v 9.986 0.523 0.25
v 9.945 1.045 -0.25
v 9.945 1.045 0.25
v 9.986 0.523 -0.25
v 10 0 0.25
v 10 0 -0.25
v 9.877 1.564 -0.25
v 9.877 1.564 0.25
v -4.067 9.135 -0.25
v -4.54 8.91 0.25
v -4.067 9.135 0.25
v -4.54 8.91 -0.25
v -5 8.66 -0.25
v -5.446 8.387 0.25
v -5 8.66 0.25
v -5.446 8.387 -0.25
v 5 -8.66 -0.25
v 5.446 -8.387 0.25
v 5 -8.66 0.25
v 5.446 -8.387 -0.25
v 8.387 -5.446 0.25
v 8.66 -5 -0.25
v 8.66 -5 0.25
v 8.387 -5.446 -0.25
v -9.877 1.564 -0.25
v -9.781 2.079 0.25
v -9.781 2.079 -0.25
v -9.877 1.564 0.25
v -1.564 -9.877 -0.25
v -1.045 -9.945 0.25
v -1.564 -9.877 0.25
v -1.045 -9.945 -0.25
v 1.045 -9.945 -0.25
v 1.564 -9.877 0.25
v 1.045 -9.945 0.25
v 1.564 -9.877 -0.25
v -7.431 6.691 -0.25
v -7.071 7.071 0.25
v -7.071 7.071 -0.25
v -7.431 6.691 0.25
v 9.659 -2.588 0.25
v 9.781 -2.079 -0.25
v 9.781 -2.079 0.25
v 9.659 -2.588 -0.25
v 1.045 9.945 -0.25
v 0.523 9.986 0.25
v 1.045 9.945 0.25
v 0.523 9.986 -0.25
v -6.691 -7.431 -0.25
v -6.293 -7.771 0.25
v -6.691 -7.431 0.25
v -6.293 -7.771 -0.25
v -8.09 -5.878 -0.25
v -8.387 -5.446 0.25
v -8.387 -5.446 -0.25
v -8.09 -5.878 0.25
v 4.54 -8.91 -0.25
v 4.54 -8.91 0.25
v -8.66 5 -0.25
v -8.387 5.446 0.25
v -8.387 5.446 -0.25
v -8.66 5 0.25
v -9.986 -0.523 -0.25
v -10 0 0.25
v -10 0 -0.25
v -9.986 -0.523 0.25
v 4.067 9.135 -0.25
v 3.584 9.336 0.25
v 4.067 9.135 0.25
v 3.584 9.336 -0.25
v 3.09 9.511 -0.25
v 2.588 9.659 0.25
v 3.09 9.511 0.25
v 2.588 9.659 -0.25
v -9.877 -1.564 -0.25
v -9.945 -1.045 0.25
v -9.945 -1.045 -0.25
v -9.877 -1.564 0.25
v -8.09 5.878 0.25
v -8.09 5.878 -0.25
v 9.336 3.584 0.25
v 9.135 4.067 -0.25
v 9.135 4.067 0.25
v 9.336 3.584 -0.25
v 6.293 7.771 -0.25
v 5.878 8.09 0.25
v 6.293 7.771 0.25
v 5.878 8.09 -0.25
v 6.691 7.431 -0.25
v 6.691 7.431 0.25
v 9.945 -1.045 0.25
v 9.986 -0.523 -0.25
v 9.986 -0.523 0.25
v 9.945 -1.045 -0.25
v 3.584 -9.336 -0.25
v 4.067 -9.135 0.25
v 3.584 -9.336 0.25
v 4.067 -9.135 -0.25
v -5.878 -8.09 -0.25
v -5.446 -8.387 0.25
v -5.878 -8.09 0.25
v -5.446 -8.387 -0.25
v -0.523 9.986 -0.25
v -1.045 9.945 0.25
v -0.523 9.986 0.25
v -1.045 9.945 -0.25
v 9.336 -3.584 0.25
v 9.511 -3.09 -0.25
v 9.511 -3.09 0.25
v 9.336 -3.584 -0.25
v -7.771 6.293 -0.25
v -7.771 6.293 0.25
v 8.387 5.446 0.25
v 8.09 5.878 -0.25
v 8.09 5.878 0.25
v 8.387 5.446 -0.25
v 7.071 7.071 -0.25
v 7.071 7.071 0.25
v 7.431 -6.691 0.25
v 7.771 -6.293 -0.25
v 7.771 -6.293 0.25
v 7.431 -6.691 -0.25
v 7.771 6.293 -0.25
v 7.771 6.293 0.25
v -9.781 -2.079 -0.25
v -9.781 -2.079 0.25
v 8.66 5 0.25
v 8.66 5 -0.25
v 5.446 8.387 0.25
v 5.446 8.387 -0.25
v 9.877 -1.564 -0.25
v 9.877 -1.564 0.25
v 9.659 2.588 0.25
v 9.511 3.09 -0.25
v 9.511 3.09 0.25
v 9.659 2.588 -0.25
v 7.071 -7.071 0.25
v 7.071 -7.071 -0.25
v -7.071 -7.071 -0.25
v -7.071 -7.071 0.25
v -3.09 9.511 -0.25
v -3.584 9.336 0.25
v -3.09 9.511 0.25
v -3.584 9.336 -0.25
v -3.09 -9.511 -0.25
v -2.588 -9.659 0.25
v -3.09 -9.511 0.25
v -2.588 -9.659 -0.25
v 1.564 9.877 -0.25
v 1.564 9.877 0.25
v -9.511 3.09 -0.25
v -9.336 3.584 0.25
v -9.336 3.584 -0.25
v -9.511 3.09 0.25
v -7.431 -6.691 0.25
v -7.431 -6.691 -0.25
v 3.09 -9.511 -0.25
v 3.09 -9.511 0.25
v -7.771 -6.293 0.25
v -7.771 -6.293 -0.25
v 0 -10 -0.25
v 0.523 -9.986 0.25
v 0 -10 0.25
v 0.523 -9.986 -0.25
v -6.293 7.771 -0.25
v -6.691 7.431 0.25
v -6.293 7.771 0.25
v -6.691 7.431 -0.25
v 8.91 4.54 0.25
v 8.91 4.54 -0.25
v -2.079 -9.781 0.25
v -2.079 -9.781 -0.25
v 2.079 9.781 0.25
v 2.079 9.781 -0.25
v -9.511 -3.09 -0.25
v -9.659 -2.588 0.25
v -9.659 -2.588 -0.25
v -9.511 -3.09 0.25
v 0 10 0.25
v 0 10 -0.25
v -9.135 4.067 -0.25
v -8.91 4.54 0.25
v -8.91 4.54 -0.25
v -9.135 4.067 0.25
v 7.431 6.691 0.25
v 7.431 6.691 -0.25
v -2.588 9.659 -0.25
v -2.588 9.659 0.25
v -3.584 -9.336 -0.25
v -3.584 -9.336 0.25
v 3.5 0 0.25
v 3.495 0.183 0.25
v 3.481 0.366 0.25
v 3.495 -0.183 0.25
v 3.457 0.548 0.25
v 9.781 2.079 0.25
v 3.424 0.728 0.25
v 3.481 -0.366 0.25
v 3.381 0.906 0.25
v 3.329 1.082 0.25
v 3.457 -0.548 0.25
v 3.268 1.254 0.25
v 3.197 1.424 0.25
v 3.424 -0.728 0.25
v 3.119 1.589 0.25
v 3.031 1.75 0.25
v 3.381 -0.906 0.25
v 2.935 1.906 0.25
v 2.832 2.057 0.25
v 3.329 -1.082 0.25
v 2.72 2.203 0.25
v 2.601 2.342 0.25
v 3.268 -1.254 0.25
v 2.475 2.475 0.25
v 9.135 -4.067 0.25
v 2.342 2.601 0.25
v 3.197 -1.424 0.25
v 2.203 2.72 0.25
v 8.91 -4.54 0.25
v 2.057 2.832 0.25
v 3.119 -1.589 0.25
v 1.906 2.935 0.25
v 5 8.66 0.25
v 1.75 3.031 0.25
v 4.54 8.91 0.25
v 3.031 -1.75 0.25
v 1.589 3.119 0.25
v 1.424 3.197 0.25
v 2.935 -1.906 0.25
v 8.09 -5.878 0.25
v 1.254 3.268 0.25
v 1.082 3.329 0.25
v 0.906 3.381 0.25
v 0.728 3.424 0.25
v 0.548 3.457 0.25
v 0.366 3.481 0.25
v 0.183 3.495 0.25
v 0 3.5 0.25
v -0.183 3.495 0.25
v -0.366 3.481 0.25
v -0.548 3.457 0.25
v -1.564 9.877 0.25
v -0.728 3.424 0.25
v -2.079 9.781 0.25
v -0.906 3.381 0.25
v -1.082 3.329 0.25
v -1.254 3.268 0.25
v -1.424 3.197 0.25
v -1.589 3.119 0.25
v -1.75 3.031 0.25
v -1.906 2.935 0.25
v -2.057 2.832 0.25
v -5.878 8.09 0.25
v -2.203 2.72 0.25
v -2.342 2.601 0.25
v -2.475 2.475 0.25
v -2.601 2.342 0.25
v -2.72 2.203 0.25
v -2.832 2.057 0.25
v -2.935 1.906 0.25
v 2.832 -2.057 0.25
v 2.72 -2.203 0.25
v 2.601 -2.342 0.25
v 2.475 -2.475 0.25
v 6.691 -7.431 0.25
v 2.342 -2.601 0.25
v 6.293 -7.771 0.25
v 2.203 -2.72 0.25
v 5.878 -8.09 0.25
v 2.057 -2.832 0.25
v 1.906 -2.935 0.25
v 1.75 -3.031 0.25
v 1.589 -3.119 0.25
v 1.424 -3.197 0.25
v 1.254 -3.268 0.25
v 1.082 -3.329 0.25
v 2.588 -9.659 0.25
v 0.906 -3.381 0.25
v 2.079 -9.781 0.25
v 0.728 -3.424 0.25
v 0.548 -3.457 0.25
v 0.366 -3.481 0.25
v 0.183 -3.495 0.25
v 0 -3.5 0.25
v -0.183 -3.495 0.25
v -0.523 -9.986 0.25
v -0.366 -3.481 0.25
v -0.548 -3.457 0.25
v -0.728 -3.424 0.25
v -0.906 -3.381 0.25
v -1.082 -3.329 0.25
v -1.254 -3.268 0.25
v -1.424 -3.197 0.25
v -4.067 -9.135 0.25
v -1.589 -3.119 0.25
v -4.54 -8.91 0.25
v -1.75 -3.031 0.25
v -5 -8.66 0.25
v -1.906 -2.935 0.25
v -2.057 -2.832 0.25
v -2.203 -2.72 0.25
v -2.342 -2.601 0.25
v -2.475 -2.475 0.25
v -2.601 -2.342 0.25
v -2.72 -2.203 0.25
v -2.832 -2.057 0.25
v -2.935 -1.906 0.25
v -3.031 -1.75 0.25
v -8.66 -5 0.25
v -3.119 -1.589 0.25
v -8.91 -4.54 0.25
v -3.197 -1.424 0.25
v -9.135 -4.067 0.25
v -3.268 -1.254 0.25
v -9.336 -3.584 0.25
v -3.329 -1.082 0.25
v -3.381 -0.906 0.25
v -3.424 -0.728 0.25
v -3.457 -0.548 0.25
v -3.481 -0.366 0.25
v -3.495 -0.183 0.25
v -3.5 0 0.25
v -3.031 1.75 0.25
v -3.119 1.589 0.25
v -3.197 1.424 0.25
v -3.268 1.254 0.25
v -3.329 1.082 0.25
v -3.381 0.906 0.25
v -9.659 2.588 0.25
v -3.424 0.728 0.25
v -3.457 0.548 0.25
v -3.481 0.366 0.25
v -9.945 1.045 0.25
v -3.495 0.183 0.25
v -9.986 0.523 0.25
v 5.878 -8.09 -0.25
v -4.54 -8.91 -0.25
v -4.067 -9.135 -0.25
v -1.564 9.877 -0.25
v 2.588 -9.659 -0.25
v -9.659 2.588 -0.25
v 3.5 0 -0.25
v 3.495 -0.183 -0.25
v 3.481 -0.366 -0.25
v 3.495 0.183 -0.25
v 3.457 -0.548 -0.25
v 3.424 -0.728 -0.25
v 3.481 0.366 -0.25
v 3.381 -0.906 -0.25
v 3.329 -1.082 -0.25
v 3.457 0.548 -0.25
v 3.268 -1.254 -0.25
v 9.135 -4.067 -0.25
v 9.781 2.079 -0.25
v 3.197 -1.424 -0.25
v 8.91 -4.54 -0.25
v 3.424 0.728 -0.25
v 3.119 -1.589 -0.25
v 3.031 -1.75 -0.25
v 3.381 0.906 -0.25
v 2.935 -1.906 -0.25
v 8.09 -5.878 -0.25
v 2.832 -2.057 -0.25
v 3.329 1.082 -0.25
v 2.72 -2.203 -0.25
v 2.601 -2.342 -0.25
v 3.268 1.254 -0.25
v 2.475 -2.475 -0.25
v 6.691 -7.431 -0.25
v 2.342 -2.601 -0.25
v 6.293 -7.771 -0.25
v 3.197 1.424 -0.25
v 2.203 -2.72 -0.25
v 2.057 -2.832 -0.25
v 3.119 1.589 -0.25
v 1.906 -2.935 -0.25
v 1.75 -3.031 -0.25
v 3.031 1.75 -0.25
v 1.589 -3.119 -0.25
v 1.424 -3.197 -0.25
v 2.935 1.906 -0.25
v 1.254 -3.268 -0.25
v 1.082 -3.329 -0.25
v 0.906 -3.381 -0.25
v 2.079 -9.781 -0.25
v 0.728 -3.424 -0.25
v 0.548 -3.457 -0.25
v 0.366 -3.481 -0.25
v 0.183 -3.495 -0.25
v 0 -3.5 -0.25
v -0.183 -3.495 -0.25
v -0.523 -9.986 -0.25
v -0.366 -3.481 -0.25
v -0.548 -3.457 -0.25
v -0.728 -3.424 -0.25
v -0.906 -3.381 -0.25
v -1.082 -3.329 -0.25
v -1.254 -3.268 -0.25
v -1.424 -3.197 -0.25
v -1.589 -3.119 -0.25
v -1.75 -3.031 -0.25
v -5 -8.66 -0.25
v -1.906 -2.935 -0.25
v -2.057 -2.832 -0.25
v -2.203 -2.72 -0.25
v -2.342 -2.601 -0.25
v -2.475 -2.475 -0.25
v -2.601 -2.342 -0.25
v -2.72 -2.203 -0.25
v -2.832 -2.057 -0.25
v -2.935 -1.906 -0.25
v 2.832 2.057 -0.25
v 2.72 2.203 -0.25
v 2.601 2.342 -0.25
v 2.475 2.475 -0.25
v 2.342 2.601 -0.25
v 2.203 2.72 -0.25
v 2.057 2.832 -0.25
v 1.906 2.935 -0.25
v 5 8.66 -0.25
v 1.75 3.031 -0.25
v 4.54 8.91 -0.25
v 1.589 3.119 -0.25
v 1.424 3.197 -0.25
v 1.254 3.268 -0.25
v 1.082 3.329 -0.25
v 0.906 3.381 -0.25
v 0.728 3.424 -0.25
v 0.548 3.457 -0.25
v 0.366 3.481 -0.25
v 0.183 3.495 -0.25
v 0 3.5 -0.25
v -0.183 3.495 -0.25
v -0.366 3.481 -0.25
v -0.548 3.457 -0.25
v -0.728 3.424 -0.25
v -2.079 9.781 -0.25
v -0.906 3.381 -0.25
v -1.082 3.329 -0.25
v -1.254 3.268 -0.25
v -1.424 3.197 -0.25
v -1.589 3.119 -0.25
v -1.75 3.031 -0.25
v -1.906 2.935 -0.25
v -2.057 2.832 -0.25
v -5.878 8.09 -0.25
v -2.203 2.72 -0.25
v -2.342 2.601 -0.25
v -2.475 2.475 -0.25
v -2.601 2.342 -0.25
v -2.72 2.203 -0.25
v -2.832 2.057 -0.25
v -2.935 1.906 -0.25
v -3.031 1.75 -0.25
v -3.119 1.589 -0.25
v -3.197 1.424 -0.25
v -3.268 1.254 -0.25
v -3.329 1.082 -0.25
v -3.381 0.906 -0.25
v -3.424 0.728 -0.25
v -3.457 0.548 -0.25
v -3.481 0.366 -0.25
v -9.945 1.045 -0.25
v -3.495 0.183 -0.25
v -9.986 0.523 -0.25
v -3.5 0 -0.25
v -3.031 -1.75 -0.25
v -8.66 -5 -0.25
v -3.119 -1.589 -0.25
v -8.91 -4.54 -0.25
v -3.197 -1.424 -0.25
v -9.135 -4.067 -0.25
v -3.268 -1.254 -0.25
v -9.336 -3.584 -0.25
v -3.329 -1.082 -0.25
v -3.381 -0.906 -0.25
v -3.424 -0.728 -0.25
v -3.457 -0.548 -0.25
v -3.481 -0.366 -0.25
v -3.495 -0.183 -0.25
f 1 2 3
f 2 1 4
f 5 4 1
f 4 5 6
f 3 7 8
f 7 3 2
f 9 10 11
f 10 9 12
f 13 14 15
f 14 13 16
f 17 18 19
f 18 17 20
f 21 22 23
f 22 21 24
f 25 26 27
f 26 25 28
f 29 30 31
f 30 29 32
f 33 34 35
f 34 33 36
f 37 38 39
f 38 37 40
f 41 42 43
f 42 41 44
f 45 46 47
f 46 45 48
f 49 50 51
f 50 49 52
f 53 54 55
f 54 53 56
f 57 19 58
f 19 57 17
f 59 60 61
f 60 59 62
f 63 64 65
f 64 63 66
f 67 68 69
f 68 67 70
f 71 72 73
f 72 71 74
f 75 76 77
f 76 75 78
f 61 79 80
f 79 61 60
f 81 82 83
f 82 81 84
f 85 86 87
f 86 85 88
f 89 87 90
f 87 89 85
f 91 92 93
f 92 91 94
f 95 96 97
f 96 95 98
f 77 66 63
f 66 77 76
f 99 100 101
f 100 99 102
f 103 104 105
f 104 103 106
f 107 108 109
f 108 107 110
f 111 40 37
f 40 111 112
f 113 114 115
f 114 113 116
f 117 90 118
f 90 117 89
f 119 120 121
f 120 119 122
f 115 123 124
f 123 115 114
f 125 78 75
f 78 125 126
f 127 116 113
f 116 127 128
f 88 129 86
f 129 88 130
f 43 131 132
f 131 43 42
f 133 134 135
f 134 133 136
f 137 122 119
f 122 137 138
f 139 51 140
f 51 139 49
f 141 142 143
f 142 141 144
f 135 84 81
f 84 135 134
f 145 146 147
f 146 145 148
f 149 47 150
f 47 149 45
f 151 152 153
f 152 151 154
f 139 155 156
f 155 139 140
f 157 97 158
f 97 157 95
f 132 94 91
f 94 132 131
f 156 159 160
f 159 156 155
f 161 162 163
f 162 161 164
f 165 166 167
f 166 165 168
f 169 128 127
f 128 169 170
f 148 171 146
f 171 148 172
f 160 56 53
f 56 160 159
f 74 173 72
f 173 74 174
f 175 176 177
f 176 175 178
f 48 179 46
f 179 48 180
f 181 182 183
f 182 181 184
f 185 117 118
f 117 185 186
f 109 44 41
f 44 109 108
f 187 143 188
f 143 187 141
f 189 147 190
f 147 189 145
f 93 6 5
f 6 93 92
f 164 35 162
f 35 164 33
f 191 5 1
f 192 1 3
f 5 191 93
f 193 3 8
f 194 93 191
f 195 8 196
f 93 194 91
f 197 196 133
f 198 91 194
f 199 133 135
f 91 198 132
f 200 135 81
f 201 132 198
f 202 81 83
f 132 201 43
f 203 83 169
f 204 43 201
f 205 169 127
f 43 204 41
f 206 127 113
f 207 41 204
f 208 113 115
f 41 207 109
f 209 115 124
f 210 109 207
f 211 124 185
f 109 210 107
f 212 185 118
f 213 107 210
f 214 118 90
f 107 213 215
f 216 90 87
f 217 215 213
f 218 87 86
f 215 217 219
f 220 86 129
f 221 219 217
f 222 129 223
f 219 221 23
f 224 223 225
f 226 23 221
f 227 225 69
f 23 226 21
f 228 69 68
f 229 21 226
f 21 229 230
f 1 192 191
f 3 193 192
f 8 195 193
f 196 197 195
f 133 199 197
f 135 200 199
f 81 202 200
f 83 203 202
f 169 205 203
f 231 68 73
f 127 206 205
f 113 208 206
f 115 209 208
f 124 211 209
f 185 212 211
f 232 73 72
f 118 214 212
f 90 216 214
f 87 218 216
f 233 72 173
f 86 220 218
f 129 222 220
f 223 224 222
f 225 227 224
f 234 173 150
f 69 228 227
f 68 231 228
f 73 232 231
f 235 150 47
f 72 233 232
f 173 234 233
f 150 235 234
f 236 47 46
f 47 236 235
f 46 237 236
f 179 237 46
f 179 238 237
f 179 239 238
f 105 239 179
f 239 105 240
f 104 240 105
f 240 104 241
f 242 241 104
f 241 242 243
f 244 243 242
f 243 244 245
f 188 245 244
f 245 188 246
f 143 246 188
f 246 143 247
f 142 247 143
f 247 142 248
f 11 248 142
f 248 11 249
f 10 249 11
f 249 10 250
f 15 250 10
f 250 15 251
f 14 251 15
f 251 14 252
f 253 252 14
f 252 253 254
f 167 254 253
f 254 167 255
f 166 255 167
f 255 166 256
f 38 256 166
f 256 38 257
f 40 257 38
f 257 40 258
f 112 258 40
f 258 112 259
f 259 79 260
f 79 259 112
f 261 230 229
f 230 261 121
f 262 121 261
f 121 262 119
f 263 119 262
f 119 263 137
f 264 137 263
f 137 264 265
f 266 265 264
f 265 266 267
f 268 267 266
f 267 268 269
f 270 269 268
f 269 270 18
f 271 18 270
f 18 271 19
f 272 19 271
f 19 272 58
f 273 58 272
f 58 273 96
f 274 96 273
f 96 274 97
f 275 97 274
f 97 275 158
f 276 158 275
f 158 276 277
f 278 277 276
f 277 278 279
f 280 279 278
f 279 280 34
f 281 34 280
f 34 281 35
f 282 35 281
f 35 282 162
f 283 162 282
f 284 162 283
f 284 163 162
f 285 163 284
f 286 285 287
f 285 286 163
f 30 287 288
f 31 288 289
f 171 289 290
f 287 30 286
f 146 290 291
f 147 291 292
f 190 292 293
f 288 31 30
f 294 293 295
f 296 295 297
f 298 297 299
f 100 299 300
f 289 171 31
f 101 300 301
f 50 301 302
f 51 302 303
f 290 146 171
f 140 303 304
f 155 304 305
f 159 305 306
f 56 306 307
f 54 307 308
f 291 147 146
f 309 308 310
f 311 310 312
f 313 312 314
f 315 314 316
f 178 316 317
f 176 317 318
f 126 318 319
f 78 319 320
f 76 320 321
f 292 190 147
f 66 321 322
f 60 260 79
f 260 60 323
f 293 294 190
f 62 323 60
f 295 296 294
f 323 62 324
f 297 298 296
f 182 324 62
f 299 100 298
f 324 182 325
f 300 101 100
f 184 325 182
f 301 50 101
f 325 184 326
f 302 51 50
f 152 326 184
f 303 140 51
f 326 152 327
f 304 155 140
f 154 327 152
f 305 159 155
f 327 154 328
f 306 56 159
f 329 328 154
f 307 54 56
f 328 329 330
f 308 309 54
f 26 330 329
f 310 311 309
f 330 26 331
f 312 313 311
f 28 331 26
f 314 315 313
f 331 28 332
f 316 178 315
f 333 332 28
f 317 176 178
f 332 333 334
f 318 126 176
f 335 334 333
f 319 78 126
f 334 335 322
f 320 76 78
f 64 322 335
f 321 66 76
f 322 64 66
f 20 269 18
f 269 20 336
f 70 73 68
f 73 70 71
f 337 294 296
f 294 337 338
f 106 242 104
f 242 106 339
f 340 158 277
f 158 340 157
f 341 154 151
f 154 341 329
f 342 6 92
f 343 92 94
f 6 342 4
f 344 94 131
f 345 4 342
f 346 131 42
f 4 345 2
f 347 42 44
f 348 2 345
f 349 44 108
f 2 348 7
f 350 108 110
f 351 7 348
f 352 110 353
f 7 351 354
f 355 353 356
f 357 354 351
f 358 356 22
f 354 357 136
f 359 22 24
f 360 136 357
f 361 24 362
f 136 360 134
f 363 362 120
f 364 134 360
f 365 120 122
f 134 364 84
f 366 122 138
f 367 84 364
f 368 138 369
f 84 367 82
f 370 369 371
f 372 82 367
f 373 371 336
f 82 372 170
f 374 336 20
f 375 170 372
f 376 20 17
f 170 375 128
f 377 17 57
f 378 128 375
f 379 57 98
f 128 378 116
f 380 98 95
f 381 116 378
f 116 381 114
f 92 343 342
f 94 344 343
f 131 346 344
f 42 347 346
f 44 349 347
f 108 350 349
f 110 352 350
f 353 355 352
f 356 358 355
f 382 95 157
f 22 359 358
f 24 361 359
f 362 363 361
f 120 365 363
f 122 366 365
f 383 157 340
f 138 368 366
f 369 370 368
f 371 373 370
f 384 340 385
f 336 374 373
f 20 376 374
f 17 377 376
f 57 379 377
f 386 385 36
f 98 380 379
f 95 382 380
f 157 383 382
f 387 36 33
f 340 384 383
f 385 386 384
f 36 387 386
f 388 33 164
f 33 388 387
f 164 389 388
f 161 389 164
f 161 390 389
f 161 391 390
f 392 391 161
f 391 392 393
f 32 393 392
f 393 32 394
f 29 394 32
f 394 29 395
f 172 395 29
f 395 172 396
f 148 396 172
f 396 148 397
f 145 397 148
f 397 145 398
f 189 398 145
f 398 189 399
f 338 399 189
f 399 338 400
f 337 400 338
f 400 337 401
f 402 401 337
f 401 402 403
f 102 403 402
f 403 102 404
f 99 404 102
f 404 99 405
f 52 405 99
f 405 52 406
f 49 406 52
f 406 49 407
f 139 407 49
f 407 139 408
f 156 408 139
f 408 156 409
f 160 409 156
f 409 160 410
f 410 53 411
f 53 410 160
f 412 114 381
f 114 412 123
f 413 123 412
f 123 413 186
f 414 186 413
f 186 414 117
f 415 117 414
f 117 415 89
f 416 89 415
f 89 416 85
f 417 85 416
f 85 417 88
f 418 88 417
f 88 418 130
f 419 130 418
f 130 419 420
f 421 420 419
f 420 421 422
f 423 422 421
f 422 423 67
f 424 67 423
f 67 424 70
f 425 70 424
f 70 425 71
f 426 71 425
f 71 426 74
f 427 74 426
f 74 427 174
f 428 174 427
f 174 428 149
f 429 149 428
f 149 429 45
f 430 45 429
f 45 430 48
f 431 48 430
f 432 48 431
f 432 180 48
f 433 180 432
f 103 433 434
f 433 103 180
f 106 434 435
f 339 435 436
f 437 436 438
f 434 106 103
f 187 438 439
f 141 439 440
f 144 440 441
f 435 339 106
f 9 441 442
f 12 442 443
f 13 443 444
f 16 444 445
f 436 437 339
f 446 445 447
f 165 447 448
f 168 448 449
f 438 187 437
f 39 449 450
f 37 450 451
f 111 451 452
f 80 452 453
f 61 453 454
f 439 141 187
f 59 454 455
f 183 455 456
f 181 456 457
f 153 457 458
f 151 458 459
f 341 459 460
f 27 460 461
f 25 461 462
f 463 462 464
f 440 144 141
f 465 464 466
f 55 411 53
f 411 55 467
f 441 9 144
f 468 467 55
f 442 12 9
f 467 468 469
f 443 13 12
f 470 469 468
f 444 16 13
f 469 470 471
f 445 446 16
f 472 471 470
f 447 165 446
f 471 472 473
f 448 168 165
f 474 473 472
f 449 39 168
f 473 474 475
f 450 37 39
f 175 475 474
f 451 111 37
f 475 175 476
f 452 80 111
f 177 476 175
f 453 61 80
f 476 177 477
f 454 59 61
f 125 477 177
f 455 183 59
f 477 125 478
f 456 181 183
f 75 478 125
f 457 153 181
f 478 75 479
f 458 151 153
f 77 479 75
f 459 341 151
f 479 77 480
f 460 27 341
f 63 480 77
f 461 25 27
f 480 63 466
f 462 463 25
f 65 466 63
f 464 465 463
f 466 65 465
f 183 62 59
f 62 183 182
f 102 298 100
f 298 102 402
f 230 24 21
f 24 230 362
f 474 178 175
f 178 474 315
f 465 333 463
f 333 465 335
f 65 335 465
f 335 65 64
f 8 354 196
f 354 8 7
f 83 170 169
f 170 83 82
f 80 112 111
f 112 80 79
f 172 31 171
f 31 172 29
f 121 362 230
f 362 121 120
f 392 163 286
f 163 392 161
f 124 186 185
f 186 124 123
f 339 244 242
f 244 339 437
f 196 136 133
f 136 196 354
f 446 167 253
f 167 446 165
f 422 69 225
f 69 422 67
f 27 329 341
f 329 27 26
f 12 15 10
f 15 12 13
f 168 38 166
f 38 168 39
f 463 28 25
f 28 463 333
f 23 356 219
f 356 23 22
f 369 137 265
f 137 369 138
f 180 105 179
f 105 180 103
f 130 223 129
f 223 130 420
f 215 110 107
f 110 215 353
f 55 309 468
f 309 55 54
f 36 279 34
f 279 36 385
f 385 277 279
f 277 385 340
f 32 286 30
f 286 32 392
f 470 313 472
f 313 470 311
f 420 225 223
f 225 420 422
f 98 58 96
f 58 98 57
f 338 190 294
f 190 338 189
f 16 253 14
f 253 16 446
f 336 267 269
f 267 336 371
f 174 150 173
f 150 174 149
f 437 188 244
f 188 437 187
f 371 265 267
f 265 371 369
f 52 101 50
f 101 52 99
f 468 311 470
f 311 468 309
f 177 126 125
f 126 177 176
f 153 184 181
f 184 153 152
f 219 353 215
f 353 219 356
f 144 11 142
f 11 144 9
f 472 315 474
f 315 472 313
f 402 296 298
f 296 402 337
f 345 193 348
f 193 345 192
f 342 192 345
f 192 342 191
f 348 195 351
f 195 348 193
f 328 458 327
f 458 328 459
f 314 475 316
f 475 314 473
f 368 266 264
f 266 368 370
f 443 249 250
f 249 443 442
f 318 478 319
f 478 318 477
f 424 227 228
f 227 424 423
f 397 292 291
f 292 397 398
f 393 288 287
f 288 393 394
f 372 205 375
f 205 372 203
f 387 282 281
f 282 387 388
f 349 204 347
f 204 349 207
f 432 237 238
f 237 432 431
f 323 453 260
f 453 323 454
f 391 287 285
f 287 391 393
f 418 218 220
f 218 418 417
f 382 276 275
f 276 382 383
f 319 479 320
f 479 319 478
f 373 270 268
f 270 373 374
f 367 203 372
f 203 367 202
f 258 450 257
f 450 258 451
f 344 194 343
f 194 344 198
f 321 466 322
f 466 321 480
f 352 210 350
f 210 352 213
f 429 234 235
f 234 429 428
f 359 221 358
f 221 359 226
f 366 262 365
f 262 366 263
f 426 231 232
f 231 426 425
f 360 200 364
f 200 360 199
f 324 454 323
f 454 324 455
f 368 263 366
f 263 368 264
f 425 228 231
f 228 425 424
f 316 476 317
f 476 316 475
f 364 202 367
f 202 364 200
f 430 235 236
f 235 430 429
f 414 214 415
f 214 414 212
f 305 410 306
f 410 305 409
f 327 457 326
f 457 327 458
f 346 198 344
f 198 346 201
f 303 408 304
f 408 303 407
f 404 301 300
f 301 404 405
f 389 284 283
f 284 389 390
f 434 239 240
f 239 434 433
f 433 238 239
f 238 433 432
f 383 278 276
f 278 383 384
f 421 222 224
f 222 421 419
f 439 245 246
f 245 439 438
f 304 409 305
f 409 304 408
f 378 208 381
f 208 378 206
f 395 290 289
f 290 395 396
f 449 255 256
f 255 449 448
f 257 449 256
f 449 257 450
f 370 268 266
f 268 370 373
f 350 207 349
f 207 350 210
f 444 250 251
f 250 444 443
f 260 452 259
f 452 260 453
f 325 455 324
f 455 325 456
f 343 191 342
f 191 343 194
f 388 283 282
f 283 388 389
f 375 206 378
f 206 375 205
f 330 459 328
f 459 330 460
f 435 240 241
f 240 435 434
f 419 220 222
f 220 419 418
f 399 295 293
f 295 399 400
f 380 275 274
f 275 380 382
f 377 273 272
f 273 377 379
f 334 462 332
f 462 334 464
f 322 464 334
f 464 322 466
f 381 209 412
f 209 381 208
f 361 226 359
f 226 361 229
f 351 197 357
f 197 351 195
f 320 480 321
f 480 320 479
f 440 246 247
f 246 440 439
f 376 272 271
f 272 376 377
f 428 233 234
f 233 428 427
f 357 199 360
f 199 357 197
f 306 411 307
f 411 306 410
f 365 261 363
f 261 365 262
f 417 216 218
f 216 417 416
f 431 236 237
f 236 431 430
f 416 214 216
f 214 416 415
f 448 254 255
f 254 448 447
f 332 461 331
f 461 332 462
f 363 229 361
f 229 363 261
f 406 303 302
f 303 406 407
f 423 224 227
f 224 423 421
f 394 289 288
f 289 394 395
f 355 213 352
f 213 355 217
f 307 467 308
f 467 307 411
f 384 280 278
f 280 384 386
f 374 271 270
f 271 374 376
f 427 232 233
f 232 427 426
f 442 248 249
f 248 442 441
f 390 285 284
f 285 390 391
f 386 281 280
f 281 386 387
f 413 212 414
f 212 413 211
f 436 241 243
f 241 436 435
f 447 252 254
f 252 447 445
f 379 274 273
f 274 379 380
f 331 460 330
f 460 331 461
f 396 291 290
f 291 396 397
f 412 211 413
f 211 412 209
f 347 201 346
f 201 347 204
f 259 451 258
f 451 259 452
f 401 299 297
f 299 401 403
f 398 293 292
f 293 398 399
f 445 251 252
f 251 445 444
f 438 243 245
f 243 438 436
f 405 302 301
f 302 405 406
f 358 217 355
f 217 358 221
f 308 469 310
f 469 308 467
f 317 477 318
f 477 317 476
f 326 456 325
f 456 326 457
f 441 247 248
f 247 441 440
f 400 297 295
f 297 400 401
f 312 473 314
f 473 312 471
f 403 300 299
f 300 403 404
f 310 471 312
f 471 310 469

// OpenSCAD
/*

By Harlo
 - 29/10/2015
 - Customizable Ring Washer 

*/



/////////////////////////////////////////////
//////////////// VARIABLES
/////////////////////////////////////////////

// Resolution of circle
res = 120; //[32, 64, 120, 200]
// Inner diameter in mm that will be cut out
inner_dia = 7; //[1:0.5:199]
// Outer diameter in mm that will form the main body of the washer
outer_dia = 20; //[10:0.5:200]
// Thickness/Depth in mm of the washer 
thickness = 0.5; //[0.5:0.5:10] 

/////////////////////////////////////////////
//////////////// RENDERS
/////////////////////////////////////////////


final();

/////////////////////////////////////////////
//////////////// MODULES
/////////////////////////////////////////////

module final(){
    difference(){
        outer_circle();
        inner_circle();
    }


}

module outer_circle(){
    
    cylinder (h = thickness, d = outer_dia, center = true, $fn = res);


}

module inner_circle(){
     cylinder (h = thickness+1, d = inner_dia, center = true, $fn = res);


}
